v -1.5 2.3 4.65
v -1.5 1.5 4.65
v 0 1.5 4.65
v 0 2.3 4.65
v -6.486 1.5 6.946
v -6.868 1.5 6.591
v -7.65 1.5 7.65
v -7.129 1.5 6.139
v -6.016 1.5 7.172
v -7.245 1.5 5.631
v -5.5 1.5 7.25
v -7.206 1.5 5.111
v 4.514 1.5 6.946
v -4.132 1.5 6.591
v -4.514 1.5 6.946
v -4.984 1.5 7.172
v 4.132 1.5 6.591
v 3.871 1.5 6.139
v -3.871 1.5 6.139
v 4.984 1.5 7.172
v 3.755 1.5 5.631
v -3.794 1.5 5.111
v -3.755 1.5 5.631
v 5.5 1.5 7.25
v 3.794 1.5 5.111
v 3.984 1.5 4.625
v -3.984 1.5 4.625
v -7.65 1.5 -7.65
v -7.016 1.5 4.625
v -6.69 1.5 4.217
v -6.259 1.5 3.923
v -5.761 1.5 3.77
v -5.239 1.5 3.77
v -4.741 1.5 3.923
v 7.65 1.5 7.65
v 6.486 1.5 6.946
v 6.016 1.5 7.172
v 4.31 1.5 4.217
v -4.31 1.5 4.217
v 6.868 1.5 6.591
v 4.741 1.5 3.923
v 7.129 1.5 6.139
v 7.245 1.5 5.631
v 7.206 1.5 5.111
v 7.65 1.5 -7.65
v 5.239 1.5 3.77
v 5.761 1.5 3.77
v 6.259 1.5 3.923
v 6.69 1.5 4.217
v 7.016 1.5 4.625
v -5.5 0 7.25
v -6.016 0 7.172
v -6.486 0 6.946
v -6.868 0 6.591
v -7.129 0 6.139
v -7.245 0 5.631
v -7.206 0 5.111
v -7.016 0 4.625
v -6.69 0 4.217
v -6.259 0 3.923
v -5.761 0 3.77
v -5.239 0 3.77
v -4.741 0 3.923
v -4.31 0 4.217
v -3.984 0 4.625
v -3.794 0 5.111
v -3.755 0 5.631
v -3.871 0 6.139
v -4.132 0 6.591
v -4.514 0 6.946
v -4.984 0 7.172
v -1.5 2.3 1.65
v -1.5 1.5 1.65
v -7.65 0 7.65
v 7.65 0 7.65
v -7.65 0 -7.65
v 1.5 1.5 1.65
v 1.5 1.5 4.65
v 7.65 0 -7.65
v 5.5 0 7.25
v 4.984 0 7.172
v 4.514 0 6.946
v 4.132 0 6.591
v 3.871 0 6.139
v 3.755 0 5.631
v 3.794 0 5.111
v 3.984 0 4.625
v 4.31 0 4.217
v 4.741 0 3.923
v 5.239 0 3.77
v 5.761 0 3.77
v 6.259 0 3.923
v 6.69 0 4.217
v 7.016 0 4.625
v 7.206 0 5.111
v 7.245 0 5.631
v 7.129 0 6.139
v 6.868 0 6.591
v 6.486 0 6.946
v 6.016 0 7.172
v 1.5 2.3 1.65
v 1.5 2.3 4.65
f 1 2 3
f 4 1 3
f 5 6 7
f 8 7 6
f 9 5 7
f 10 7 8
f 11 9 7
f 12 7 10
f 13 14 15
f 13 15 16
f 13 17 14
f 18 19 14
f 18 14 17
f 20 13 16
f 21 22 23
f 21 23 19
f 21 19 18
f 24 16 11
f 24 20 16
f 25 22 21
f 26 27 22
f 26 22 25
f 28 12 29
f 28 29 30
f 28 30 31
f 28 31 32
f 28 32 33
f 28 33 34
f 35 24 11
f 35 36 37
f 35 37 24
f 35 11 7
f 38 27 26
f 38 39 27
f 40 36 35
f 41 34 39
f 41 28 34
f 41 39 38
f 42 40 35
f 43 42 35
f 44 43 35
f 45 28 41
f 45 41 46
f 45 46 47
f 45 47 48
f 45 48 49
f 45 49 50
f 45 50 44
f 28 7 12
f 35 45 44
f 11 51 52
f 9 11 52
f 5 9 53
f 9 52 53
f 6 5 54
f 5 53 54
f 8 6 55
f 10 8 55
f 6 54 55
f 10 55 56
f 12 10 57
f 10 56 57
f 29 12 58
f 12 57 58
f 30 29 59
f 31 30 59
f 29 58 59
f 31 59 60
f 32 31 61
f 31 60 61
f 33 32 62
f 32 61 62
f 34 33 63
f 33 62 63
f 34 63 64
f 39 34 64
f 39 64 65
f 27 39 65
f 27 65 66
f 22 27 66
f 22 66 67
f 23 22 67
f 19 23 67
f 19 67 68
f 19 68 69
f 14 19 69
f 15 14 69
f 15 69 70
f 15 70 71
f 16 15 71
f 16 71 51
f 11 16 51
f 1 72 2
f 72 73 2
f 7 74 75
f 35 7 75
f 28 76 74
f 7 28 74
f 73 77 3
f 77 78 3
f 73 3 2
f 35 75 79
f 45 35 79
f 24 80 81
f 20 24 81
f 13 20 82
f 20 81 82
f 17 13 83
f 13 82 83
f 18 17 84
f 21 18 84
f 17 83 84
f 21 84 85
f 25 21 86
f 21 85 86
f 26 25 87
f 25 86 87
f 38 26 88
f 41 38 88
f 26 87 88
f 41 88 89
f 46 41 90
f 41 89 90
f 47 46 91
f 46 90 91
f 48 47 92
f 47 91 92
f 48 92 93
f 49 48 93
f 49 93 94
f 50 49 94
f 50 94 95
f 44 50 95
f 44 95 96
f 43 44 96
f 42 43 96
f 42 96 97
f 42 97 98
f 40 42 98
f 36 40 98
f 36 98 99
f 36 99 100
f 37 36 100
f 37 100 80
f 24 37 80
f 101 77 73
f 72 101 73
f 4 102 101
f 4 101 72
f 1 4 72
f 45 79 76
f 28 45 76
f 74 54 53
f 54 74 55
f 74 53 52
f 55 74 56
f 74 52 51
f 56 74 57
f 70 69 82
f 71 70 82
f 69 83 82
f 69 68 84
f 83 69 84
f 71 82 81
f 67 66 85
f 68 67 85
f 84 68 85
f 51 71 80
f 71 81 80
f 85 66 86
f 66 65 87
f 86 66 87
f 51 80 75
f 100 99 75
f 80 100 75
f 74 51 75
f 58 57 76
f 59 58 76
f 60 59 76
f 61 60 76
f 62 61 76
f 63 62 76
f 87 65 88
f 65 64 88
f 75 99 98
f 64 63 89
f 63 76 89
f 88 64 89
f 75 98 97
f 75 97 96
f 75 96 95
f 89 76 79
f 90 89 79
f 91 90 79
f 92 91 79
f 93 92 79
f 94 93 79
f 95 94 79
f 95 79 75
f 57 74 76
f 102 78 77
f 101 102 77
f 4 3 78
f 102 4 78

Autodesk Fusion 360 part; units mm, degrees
sketch "Sketch1" plane through (0, 0, 0) normal (0, 1, 0) x (1, 0, 0)
  line L0 (7.65, 7.65) -> (-7.65, 7.65)
  line L1 (-7.65, 7.65) -> (-7.65, -7.65)
  line L2 (-7.65, -7.65) -> (7.65, -7.65)
  line L3 (7.65, -7.65) -> (7.65, 7.65)
  line L4 (7.65, 7.65) -> (-7.65, -7.65) construction
  line L5 (-7.65, 7.65) -> (7.65, -7.65) construction
  dimension "d1" = 15.3
  dimension "d2" = 15.3
extrude "Extrude1" add sketch "Sketch1" along normal blind 1.5 makes body 1
hole "Hole1" at (-5.5, 1.5, 5.5) direction (0, -1, 0) diameter 3.5 depth 3.5 tip angle 118 bodies 1
hole "Hole2" at (5.5, 1.5, 5.5) direction (0, -1, 0) diameter 3.5 depth 3.5 tip angle 118 bodies 1
sketch "Sketch2" plane through (0, 1.5, 0) normal (0, 1, 0) x (-1, 0, 0)
  circle A0 centre (-5.5, 5.5) radius 1.75
  circle A1 centre (5.5, 5.5) radius 1.75
  line L0 (-7.65, 7.65) -> (-7.65, -7.65)
  line L1 (-7.65, -7.65) -> (7.65, -7.65)
  line L2 (7.65, -7.65) -> (7.65, 7.65)
  line L3 (7.65, 7.65) -> (-7.65, 7.65)
  line L4 (0, 7.65) -> (0, 4.65)
  line L5 (0, 4.65) -> (0, 3.15)
  line L6 (-1.5, 1.65) -> (1.5, 1.65)
  line L7 (1.5, 1.65) -> (1.5, 4.65)
  line L8 (1.5, 4.65) -> (-1.5, 4.65)
  line L9 (-1.5, 4.65) -> (-1.5, 1.65)
  line L10 (-1.5, 1.65) -> (1.5, 4.65) construction
  line L11 (1.5, 1.65) -> (-1.5, 4.65) construction
  point P0 (0, 3.15)
  dimension "d15" = 3
  dimension "d16" = 1.5
  dimension "d17" = 3
  dimension "d18" = 3
extrude "Extrude2" add sketch "Sketch2" along normal blind 0.8 separate body contours L6 L7 L8 L9 makes body 2
